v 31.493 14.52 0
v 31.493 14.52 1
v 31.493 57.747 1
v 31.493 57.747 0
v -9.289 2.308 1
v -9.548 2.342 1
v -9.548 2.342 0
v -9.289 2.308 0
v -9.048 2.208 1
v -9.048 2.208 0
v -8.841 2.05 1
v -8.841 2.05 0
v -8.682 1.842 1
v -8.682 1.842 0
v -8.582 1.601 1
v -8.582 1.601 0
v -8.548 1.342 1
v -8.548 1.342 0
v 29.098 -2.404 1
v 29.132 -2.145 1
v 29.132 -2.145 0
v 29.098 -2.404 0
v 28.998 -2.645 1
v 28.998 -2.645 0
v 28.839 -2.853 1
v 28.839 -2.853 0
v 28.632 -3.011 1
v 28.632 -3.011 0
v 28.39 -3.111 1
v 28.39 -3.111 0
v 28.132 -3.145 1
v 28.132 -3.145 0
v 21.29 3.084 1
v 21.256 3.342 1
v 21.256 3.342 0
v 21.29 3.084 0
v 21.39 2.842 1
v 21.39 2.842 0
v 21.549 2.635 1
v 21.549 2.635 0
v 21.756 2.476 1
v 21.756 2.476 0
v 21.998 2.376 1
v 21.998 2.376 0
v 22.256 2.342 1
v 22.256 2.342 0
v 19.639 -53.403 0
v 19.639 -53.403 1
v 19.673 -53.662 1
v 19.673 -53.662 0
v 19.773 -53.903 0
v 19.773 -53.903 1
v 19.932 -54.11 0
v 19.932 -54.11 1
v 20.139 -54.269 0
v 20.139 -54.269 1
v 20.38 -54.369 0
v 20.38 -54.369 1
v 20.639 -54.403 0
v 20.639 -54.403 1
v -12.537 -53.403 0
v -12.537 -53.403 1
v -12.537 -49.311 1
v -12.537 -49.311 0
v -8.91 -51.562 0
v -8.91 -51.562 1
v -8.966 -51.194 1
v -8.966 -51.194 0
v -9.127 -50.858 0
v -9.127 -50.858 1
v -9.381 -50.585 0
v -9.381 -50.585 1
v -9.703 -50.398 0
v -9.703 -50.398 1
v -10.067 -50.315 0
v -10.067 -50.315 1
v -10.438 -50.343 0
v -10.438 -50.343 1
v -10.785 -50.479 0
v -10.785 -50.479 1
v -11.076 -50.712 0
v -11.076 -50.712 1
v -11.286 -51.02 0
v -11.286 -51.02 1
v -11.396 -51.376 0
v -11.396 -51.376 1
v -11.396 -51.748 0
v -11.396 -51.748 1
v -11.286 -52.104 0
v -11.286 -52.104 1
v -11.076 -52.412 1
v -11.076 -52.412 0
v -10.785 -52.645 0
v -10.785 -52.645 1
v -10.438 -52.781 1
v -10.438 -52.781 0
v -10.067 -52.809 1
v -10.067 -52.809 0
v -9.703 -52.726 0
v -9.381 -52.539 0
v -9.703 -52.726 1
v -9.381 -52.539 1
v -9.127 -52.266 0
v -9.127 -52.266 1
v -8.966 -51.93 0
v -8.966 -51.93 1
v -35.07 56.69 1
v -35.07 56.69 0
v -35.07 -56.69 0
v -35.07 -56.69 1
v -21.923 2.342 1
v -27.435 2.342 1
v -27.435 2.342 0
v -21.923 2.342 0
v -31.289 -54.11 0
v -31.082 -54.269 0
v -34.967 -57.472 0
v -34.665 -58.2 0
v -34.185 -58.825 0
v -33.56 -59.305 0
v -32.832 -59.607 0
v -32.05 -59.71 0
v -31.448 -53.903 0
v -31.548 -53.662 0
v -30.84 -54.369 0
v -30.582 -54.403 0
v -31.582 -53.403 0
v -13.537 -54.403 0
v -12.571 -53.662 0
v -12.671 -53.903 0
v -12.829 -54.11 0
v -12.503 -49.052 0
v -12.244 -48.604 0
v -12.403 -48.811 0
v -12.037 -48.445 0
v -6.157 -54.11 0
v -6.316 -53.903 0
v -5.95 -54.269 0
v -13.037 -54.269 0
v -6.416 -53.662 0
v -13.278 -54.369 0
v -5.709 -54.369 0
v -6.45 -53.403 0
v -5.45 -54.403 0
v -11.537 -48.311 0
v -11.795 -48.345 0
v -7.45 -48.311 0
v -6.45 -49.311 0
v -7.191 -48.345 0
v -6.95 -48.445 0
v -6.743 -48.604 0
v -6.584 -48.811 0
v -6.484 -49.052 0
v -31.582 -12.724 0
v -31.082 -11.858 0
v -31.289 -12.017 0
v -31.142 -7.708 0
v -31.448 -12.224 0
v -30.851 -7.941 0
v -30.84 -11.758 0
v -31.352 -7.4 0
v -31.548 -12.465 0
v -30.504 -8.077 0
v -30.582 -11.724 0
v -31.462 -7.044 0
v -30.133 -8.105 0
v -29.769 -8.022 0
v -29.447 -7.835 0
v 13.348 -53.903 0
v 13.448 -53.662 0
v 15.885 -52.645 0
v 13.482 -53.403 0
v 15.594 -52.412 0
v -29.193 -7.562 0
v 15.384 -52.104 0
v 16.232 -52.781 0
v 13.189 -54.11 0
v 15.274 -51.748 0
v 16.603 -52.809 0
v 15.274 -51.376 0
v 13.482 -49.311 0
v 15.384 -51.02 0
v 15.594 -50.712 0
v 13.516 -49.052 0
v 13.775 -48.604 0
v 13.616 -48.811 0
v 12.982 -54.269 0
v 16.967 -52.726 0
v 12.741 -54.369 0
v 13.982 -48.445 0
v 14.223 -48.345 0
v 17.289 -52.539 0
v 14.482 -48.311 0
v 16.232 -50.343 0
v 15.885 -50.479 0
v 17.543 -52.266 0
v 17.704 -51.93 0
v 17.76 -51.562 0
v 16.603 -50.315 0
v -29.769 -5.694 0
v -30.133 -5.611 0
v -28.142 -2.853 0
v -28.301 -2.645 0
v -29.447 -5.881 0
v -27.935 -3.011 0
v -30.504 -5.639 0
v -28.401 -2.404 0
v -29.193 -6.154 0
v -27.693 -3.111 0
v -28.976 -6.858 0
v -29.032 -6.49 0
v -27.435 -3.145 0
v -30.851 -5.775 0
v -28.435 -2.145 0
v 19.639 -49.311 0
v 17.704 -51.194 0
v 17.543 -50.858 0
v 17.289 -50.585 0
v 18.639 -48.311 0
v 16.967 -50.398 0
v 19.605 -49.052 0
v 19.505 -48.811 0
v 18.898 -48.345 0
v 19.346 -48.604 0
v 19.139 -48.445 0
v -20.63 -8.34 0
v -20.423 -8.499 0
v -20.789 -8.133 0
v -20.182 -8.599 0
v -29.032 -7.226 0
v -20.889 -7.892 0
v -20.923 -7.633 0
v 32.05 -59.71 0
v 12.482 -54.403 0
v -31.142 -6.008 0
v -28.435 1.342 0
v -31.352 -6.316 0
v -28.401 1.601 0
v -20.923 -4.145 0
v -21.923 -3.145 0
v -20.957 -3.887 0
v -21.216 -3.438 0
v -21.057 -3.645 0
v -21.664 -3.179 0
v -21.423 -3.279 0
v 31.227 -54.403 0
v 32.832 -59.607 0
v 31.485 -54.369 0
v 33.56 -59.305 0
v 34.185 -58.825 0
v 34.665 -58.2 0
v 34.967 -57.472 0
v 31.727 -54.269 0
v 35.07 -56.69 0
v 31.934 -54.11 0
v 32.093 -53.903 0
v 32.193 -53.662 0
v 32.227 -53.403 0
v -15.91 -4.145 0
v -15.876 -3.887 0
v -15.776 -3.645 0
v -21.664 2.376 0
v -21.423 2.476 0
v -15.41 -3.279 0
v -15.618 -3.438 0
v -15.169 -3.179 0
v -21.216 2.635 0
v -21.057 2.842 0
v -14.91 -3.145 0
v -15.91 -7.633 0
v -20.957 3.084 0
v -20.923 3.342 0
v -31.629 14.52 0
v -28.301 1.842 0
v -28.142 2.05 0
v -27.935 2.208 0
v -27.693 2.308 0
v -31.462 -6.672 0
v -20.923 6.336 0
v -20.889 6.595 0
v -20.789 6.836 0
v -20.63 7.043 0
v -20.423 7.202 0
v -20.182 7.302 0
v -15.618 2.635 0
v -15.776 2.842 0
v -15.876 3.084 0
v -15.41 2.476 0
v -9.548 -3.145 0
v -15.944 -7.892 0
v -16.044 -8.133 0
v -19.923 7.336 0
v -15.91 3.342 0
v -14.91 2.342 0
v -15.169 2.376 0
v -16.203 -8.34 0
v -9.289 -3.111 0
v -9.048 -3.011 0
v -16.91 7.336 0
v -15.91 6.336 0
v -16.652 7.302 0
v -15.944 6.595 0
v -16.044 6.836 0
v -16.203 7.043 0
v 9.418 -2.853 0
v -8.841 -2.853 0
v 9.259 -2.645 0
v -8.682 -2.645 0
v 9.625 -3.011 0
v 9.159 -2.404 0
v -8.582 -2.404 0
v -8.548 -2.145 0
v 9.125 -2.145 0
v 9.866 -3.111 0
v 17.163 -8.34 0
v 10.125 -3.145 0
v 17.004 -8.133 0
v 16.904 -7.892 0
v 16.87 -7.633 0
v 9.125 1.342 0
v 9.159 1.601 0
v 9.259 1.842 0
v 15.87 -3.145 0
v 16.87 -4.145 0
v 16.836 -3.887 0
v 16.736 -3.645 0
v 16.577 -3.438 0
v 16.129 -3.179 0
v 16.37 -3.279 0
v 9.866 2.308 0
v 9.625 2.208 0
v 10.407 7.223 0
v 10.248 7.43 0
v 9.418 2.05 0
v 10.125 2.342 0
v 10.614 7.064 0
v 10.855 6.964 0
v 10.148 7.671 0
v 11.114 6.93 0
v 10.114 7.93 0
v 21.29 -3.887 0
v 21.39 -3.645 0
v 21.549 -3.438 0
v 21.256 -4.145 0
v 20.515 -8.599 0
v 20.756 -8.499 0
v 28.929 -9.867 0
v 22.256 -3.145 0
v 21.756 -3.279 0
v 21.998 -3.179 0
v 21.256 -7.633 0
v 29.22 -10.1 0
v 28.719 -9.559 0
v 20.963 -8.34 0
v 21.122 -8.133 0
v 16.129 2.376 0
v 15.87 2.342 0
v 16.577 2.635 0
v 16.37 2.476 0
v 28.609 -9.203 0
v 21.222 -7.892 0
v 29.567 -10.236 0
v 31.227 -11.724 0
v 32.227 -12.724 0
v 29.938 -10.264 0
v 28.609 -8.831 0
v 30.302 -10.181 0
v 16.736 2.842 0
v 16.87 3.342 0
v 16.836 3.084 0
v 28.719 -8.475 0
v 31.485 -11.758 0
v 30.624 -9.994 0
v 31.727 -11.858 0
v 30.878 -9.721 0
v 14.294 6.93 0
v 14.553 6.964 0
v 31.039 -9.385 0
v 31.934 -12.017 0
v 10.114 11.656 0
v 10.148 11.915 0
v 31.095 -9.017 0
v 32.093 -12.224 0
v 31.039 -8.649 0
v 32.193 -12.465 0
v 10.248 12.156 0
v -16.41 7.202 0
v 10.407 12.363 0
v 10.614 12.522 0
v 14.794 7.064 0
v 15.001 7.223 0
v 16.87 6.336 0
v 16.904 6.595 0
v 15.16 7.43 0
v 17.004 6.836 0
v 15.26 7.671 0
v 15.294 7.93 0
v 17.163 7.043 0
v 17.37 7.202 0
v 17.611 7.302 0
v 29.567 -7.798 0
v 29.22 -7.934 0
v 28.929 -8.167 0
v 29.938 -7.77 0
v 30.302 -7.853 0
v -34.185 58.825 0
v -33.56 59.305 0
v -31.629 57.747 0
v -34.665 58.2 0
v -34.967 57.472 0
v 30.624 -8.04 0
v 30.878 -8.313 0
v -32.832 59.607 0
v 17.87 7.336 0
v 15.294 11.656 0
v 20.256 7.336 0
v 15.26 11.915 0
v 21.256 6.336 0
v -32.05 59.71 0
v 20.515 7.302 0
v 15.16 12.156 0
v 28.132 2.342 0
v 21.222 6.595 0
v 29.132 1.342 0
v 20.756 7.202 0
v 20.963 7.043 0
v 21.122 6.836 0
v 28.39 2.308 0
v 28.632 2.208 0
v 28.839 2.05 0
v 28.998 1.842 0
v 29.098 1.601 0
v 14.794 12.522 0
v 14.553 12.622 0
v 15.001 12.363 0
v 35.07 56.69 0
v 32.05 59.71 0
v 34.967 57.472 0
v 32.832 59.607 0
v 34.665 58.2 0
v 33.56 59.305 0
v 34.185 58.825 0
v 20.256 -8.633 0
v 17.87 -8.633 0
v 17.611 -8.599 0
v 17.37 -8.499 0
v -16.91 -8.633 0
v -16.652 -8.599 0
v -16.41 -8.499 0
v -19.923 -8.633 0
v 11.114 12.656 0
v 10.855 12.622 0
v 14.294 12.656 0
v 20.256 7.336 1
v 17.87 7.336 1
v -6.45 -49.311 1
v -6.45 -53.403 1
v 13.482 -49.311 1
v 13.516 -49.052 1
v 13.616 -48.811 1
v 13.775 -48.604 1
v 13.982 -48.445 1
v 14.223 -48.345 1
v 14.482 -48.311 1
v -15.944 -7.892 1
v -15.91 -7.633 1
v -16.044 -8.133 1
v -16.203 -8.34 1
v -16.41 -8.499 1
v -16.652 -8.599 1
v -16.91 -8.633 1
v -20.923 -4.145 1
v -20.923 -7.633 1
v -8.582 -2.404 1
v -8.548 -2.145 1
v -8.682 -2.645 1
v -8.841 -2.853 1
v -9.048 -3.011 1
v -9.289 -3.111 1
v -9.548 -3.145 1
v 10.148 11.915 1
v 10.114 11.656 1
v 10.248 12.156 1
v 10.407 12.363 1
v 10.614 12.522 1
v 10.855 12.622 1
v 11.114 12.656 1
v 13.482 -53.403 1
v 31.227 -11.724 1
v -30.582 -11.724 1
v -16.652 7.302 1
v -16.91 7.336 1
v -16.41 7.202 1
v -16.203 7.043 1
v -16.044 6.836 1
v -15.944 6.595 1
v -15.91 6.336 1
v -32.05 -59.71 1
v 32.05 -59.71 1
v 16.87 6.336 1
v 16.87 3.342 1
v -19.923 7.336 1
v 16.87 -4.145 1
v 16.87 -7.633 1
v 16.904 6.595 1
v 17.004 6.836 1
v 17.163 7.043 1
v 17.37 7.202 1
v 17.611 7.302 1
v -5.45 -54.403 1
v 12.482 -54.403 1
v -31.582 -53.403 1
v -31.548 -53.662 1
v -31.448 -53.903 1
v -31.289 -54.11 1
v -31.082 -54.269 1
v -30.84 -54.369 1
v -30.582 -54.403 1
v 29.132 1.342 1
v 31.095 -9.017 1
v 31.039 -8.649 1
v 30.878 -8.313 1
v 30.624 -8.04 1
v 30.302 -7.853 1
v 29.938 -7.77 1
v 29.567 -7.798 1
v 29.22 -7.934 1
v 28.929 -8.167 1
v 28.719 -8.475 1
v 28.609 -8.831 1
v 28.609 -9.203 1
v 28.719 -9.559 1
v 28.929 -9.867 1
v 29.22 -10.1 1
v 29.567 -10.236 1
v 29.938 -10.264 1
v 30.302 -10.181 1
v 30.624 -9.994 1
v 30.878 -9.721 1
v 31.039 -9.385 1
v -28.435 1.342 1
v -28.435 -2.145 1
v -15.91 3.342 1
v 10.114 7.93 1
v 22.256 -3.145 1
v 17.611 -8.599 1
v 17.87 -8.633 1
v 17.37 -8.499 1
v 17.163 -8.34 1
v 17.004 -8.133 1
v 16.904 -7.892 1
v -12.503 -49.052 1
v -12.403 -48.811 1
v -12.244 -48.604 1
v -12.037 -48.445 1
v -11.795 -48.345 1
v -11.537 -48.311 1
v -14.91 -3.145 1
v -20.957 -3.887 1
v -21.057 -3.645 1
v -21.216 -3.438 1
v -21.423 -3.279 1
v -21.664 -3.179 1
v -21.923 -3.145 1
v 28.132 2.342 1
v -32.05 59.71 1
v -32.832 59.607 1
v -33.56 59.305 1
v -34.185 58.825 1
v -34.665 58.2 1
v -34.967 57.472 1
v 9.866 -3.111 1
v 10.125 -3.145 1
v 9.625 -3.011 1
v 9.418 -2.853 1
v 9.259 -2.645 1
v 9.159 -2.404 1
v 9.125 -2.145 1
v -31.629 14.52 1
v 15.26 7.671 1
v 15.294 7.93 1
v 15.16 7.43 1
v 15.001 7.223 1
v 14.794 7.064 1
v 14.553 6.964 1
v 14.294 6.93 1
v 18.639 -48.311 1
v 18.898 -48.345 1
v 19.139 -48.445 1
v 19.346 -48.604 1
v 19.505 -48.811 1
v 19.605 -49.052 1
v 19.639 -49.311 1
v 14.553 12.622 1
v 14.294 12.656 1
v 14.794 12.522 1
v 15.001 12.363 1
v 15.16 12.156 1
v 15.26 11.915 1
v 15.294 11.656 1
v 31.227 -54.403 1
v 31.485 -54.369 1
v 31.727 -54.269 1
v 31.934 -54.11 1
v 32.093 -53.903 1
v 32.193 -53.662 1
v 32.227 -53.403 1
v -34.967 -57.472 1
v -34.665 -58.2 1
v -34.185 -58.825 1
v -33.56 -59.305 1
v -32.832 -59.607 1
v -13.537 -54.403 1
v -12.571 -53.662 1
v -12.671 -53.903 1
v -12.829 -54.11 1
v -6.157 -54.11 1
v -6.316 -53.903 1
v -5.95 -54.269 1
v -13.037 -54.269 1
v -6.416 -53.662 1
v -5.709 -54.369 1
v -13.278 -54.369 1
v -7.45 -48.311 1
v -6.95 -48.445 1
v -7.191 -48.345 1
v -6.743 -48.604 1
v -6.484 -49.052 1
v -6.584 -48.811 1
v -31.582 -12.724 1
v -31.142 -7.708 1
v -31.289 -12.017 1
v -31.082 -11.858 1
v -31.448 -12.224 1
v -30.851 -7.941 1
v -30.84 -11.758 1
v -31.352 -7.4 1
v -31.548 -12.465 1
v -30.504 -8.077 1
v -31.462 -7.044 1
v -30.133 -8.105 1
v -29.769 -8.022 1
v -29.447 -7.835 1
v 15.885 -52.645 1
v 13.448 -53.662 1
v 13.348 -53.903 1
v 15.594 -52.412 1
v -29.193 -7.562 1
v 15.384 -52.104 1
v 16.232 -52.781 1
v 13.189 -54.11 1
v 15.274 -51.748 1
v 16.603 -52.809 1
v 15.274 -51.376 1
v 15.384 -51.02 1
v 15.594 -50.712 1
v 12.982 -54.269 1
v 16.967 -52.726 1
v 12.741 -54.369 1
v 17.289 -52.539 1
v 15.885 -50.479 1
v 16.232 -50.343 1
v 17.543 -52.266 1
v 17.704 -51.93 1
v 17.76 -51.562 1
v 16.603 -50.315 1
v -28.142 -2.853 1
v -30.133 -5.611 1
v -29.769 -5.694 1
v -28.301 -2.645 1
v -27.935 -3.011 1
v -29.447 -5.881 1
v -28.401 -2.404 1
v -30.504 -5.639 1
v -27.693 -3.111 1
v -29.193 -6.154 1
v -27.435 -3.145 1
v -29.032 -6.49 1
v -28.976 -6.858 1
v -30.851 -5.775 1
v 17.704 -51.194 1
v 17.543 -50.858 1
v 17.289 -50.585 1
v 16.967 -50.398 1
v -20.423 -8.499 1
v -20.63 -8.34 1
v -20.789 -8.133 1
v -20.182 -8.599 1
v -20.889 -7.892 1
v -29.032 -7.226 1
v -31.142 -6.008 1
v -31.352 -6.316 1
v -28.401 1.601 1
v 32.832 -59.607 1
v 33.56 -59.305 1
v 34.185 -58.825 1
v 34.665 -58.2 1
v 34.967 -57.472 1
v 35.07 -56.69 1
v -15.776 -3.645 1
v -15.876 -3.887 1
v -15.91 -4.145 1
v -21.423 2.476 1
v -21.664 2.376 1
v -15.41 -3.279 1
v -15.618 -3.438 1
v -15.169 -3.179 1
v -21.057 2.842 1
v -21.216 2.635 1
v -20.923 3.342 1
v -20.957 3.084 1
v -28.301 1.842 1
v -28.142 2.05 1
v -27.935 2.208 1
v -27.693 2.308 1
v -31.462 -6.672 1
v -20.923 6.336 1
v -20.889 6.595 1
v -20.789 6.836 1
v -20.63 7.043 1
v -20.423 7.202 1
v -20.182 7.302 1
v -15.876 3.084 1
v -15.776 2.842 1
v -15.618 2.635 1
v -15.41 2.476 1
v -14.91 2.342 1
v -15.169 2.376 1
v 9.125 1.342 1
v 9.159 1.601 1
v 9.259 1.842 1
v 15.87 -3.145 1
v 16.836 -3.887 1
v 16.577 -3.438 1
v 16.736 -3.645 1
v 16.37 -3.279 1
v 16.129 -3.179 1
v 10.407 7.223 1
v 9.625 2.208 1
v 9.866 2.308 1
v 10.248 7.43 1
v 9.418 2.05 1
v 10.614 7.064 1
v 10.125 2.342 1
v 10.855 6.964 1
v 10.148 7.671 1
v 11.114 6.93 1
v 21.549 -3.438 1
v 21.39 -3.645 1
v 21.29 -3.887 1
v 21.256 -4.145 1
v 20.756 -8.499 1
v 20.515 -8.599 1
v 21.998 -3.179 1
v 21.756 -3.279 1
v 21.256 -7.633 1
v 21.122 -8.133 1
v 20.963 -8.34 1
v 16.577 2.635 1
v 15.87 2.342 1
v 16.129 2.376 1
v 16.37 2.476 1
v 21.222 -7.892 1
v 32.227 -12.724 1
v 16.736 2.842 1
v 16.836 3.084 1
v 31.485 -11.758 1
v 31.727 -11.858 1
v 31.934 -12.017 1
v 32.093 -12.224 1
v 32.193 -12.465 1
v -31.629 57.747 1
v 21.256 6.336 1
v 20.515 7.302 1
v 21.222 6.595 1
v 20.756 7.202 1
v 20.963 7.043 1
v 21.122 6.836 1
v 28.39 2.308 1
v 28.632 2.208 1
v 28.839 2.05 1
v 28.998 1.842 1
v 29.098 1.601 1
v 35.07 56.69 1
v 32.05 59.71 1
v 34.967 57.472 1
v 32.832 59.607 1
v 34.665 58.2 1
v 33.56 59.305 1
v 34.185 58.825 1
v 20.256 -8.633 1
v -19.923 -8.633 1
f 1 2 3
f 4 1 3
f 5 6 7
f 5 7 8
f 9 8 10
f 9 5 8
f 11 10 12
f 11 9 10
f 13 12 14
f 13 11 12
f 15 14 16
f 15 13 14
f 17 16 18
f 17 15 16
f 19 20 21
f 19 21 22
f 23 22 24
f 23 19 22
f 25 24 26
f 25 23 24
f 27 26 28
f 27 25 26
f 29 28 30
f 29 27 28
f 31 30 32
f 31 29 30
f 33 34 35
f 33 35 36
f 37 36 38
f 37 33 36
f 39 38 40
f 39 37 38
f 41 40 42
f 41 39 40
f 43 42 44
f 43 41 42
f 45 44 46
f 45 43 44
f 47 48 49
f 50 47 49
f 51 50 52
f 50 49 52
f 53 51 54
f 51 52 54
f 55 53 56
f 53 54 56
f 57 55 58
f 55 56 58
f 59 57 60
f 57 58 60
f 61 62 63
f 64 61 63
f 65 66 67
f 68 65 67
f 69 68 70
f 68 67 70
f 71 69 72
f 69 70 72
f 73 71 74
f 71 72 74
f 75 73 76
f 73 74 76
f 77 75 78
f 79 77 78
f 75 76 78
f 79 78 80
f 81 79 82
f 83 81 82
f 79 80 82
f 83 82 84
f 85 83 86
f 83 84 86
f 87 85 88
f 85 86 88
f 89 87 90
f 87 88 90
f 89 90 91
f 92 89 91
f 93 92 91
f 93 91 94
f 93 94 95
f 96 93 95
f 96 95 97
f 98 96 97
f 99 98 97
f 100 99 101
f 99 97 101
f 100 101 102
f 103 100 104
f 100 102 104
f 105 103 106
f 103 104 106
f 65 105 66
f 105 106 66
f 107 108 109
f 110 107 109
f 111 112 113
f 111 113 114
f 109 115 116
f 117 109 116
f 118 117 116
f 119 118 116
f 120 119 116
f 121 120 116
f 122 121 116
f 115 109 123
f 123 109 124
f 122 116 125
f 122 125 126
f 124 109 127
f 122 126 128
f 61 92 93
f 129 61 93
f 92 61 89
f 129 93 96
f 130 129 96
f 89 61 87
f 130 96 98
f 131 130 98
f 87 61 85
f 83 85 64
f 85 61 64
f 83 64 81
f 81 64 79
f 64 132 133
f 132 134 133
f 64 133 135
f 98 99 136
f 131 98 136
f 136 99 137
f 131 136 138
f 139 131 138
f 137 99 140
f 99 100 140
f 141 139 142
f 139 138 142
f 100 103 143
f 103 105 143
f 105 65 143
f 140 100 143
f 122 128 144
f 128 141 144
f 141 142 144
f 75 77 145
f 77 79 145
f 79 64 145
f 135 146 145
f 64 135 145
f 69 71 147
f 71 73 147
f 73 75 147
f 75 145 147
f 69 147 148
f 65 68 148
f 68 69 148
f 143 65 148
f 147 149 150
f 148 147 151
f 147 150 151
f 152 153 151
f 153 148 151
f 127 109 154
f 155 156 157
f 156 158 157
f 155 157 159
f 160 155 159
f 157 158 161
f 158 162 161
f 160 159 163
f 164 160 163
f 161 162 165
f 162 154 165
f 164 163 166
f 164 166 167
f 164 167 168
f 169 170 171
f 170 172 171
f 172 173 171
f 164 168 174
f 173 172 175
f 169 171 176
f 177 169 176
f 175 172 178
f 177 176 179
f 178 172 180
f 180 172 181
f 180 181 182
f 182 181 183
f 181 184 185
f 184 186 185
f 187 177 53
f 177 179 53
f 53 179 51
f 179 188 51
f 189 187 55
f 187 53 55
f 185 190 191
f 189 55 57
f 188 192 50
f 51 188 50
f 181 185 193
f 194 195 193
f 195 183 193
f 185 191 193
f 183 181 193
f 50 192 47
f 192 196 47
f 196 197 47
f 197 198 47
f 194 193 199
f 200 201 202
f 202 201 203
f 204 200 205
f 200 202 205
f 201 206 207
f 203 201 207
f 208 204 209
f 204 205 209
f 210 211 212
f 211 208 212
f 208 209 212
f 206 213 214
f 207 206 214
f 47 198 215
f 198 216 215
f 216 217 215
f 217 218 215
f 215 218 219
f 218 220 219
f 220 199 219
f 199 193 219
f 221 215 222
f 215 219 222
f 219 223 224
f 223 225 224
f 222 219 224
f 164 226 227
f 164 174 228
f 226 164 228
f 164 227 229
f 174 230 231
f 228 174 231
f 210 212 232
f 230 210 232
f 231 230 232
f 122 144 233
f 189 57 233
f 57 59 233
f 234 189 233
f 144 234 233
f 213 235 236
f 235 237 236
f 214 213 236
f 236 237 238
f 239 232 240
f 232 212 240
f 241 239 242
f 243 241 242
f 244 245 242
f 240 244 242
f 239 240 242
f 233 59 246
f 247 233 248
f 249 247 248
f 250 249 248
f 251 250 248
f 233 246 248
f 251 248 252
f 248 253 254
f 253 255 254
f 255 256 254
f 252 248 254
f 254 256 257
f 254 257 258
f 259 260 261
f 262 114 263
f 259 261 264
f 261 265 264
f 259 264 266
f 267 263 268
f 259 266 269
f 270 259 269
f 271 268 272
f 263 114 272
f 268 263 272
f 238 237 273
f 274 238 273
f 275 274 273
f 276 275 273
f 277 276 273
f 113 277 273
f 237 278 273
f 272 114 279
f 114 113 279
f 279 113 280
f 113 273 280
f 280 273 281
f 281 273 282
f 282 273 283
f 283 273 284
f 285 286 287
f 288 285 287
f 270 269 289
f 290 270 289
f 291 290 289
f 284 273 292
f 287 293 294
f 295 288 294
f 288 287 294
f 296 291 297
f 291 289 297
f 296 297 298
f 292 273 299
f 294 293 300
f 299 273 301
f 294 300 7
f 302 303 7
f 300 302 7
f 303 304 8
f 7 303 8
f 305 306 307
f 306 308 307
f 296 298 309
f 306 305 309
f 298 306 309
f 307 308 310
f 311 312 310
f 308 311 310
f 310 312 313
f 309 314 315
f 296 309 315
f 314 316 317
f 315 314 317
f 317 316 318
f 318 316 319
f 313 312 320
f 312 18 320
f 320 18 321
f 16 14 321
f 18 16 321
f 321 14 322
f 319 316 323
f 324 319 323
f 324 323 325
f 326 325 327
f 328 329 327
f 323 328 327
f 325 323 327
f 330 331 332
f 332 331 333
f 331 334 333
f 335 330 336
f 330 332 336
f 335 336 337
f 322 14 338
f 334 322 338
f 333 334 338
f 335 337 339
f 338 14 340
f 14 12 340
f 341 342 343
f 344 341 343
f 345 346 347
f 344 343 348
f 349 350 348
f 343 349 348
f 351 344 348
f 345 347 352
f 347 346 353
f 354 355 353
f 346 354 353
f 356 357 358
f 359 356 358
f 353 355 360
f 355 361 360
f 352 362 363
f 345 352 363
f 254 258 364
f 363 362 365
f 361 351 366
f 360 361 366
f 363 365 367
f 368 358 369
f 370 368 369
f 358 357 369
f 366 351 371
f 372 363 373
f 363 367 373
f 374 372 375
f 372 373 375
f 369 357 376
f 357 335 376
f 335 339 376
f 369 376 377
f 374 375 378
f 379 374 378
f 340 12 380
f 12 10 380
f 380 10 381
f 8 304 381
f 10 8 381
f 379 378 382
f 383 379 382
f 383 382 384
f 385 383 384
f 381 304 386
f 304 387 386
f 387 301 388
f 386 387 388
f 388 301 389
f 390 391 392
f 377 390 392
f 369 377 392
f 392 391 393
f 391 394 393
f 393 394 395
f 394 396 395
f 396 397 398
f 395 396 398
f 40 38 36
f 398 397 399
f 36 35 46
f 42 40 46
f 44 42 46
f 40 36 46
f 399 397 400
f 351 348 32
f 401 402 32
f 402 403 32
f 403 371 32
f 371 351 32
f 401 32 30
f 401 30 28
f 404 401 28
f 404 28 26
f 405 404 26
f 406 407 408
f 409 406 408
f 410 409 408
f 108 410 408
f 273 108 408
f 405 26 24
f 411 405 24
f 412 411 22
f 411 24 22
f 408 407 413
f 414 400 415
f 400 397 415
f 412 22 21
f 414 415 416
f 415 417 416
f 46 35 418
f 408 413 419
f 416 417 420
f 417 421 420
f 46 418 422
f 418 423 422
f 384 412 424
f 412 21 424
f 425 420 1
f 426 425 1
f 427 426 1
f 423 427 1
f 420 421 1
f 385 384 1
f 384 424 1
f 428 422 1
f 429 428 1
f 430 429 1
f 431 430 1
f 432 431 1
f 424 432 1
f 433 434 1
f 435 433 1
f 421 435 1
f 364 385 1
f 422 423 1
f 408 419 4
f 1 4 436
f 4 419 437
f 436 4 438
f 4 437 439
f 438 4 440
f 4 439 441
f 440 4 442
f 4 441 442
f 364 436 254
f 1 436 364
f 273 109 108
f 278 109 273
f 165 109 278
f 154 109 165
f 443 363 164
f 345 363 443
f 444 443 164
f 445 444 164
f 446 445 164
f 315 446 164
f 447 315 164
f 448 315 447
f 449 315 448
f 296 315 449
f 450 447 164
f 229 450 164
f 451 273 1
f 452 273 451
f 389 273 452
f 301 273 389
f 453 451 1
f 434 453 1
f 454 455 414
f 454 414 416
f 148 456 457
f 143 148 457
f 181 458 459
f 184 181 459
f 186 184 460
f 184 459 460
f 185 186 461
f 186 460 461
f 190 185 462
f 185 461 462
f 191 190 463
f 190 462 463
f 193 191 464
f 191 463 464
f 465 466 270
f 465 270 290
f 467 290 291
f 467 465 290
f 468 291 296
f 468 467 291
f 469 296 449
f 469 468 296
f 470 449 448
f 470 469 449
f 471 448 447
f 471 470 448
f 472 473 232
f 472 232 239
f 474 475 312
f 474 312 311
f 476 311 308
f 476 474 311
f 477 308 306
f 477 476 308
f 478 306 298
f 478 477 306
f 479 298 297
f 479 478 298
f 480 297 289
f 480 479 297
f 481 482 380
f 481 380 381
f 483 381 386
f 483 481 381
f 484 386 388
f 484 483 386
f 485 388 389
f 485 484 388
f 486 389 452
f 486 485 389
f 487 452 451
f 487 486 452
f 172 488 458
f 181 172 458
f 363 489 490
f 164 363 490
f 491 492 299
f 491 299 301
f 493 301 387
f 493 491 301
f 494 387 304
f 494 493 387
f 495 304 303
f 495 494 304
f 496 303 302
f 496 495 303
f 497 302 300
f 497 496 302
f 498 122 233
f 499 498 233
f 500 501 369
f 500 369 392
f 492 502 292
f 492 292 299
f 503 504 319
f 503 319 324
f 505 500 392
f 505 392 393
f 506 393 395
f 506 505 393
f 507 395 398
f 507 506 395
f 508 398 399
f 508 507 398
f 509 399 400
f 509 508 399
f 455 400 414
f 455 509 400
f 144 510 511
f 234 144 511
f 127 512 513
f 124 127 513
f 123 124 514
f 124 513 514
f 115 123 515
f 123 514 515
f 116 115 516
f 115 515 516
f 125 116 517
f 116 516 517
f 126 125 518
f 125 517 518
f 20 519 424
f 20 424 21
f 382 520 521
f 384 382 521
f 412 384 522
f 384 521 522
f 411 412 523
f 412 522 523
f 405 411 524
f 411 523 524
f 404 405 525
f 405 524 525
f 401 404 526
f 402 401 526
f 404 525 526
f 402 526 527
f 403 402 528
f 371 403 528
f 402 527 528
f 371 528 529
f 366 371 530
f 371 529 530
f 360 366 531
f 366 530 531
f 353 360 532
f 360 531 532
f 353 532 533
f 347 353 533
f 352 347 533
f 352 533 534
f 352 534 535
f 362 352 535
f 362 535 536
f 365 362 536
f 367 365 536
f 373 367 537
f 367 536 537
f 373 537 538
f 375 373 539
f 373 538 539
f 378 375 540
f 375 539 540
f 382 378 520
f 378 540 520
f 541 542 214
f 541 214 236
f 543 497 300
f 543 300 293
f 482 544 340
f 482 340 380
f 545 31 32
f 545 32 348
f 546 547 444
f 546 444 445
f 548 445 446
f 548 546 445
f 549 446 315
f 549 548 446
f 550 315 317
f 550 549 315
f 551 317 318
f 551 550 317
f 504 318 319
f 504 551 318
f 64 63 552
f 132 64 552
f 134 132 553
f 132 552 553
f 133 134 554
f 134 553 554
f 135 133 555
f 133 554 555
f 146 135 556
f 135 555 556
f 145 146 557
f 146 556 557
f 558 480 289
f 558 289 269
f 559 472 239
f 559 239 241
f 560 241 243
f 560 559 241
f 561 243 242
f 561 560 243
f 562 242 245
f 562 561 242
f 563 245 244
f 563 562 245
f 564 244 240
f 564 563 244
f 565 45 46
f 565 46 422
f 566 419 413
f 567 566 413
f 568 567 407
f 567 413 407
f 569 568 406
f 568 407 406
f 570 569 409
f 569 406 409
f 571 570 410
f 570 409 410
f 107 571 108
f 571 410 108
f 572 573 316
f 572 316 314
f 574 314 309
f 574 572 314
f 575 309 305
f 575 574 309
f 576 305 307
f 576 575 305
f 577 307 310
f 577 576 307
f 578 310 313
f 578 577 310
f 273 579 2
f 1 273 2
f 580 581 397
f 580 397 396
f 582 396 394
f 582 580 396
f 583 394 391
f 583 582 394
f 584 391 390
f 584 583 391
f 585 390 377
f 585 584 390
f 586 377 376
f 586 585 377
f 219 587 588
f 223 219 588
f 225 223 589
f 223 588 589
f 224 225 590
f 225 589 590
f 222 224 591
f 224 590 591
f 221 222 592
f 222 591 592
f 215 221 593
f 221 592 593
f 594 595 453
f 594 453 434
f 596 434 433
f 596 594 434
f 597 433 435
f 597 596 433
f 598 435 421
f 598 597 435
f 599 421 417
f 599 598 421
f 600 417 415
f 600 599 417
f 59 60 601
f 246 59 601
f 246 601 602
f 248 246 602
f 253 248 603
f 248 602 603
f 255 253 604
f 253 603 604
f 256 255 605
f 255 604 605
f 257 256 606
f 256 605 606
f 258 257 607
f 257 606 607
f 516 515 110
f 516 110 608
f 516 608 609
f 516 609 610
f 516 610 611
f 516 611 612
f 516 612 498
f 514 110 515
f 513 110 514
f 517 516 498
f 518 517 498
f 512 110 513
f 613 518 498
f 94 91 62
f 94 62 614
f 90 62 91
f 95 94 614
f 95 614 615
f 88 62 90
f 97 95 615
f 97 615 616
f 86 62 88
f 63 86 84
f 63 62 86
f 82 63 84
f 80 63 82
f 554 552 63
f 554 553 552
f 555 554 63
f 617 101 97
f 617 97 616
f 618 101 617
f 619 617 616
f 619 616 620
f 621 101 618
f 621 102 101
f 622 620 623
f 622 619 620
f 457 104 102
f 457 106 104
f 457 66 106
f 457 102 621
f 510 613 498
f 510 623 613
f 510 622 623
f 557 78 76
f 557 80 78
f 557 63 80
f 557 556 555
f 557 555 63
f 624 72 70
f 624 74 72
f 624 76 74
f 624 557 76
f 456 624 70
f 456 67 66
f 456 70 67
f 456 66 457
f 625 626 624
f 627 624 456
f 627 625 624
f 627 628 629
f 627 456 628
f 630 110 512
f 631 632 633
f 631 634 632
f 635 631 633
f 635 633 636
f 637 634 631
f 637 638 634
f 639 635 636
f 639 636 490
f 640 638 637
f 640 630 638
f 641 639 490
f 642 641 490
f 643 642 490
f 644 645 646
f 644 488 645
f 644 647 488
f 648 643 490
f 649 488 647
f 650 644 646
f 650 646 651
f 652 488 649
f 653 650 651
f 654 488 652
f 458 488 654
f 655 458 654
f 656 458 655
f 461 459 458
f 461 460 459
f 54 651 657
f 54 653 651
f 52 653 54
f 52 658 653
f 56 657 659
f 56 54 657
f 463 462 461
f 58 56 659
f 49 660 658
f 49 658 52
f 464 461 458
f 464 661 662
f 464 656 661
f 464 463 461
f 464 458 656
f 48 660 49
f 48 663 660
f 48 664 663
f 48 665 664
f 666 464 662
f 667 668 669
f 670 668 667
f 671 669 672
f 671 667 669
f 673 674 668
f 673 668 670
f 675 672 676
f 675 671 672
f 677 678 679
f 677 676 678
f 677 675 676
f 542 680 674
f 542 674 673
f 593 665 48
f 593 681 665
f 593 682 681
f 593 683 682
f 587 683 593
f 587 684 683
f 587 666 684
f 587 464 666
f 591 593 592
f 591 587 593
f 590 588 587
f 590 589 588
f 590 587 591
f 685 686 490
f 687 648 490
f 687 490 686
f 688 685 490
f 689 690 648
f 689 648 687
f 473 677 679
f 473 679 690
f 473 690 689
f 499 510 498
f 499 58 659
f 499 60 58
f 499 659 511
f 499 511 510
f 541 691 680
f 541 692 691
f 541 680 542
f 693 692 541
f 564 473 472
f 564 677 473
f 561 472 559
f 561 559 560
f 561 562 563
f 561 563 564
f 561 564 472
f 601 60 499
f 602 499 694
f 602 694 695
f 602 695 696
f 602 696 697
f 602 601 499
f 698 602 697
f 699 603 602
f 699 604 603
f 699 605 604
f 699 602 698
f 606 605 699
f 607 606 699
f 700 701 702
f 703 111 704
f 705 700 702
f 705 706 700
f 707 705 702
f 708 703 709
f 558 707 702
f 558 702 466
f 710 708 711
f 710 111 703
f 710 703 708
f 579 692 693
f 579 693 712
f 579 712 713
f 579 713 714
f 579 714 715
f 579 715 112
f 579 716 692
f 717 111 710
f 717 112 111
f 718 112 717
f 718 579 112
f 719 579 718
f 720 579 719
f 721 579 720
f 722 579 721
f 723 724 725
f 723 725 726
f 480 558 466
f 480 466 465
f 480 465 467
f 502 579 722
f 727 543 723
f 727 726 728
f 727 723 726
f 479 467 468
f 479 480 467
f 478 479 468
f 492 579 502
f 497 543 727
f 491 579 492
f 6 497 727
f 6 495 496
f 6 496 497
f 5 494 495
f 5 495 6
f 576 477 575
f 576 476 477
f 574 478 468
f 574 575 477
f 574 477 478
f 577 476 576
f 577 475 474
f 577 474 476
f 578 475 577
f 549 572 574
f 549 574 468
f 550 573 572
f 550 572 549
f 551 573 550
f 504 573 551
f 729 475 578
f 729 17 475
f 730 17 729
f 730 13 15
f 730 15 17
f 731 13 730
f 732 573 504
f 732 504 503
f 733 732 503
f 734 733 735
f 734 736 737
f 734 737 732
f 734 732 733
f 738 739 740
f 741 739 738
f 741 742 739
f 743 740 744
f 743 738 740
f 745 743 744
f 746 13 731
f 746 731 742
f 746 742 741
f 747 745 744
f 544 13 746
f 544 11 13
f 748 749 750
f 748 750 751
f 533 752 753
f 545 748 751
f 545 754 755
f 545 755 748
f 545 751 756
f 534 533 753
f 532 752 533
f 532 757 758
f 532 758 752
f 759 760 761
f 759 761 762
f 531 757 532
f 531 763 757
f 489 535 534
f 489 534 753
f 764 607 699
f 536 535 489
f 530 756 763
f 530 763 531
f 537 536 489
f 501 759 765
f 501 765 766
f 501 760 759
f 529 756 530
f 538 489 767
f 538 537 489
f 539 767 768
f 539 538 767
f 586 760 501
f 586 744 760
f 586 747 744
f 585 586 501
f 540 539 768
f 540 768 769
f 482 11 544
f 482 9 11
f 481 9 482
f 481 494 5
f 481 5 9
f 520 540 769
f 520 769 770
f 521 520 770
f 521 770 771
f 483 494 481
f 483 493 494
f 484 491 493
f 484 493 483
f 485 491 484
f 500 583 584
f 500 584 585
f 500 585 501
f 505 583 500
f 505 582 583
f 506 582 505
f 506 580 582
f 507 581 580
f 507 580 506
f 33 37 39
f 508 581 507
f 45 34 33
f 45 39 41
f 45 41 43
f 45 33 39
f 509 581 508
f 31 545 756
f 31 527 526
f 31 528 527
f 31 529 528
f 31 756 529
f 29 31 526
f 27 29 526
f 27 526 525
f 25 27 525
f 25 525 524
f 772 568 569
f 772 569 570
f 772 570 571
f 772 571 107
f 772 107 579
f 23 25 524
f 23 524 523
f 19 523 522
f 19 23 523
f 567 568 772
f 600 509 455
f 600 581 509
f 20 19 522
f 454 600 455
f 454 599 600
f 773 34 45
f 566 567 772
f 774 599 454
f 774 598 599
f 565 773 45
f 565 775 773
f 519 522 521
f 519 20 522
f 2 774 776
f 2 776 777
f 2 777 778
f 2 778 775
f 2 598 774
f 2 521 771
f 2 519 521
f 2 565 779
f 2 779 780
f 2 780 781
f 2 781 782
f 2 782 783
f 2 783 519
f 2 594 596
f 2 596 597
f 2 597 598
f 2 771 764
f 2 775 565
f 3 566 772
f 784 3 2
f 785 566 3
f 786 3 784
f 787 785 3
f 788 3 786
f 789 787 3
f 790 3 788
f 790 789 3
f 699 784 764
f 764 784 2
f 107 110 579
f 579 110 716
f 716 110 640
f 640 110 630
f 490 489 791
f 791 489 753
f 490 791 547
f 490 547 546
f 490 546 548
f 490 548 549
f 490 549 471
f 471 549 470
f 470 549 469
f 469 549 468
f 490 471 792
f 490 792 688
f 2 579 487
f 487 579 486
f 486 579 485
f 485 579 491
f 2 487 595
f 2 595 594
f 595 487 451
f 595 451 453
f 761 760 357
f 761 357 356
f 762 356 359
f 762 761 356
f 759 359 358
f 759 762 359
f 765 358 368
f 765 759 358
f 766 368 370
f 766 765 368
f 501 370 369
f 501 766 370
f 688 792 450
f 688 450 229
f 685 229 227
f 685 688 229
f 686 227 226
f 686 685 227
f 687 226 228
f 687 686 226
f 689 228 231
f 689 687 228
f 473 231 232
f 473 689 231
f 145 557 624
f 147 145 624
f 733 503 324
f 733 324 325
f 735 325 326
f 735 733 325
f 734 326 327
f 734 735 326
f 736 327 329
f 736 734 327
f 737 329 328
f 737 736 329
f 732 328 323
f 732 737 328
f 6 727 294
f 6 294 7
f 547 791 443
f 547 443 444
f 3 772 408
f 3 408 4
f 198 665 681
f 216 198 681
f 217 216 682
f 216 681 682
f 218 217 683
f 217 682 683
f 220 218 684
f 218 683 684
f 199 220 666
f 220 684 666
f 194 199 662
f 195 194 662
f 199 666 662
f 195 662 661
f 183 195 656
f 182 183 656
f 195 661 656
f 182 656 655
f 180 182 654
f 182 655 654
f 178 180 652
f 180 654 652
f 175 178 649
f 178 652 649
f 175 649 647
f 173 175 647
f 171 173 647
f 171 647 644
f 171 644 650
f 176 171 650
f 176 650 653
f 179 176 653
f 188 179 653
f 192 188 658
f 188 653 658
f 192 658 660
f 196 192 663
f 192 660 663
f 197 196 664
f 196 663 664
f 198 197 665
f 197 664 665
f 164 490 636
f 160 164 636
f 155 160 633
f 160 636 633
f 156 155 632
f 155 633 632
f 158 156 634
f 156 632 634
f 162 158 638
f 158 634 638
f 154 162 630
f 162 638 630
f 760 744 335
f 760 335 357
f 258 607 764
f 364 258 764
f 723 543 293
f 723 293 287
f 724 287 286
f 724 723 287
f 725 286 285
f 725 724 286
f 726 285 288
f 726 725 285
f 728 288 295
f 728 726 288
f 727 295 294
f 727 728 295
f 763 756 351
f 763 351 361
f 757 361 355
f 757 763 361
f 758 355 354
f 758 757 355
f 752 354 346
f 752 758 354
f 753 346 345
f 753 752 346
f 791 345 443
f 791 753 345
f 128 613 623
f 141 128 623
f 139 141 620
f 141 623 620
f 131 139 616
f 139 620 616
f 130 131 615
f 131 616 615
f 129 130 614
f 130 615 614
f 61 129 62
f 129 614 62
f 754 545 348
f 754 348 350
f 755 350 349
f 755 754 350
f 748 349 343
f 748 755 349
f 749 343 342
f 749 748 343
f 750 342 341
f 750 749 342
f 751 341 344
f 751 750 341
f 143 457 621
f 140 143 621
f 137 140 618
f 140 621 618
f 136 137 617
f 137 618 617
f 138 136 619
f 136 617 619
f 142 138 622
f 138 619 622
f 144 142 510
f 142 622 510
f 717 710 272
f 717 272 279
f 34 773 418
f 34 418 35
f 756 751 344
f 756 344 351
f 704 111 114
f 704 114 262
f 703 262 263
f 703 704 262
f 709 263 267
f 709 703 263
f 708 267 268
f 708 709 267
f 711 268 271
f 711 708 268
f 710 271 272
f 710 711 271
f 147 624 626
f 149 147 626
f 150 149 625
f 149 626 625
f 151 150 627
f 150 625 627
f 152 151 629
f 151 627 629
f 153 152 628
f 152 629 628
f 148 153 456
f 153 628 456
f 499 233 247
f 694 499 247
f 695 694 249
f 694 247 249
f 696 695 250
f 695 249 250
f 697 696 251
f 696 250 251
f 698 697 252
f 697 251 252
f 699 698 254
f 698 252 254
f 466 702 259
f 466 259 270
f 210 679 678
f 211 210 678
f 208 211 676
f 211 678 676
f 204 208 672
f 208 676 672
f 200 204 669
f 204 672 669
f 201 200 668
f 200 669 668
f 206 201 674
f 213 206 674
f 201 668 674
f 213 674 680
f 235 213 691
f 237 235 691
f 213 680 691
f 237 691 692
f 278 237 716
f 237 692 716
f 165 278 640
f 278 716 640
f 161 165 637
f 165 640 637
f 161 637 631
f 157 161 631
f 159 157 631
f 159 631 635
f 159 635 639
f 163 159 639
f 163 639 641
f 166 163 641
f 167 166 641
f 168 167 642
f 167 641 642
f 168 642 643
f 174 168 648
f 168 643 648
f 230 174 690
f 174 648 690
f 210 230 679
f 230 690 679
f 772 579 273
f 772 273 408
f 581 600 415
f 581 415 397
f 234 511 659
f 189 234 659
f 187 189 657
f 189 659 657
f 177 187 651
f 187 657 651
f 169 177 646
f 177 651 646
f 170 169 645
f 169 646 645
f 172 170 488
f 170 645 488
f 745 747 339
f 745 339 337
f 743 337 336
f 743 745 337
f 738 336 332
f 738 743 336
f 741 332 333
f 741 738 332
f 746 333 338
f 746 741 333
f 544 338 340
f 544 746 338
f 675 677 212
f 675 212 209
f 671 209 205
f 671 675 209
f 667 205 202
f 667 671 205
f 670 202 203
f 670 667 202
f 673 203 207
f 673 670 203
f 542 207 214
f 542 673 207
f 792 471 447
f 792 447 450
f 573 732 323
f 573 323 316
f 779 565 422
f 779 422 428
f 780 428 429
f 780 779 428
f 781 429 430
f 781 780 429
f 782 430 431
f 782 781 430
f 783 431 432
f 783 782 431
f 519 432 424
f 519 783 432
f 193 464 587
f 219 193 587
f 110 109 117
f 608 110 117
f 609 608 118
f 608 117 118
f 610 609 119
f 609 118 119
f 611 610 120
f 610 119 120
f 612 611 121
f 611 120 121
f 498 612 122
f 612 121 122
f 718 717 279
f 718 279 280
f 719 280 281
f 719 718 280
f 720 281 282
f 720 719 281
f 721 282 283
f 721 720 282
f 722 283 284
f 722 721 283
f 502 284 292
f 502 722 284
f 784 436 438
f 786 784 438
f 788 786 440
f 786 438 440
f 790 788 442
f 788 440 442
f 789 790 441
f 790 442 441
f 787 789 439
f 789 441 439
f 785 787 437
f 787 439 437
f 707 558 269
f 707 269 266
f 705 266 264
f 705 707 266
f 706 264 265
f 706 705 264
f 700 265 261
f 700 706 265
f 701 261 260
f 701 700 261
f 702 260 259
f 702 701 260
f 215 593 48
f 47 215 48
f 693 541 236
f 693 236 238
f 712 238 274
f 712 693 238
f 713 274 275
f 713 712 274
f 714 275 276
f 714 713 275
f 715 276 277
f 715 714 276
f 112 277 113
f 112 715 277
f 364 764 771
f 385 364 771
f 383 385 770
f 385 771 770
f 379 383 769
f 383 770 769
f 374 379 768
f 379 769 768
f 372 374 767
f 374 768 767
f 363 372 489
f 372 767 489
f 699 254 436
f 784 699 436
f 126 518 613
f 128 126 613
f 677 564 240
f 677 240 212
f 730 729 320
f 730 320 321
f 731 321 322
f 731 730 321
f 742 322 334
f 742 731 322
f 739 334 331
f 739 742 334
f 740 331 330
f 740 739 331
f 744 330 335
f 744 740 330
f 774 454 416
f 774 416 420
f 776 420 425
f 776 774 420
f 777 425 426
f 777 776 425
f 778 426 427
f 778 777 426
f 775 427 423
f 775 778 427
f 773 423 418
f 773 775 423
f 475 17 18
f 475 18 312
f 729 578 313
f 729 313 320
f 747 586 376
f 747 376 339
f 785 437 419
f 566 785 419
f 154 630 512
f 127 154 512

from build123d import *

# Parameters (mm, degrees)
BOSS_EXTRU_1_DEPTH      = 1
ESQUISSE2_W             = 63.121311346
ESQUISSE2_H             = 43.227445896
ENL_V_MAT_EXTRU_1_DEPTH = 1
ENL_V_MAT_EXTRU_2_DEPTH = 1
ESQUISSE4_R             = 1.25
ENL_V_MAT_EXTRU_3_DEPTH = 1


with BuildPart() as part:
    # Esquisse1 → Boss.-Extru.1 (new body)
    with BuildSketch(Plane.XY):
        with BuildLine():
            Line((-32.05, -59.71), (32.05, -59.71))
            ThreePointArc((32.05, -59.71), (34.185462479, -58.825462479), (35.07, -56.69))
            Line((35.07, -56.69), (35.07, 56.69))
            ThreePointArc((35.07, 56.69), (34.185462479, 58.825462479), (32.05, 59.71))
            Line((32.05, 59.71), (-32.05, 59.71))
            ThreePointArc((-32.05, 59.71), (-34.185462479, 58.825462479), (-35.07, 56.69))
            Line((-35.07, 56.69), (-35.07, -56.69))
            ThreePointArc((-35.07, -56.69), (-34.185462479, -58.825462479), (-32.05, -59.71))
        make_face()
    extrude(amount=BOSS_EXTRU_1_DEPTH)

    # Esquisse2 → Enlèv. mat.-Extru.1 (cut)
    with BuildSketch(Plane.XY.offset(1)):
        with Locations((-0.068131464, 36.133663017)):
            Rectangle(ESQUISSE2_W, ESQUISSE2_H)
    extrude(amount=-ENL_V_MAT_EXTRU_1_DEPTH, mode=Mode.SUBTRACT)

    # Esquisse3 → Enlèv. mat.-Extru.2 (cut)
    with BuildSketch(Plane.XY.offset(1)):
        with BuildLine():
            Line((-5.450287773, -54.403229927), (12.482160985, -54.403229927))
            ThreePointArc((12.482160985, -54.403229927), (13.189267766, -54.110336708), (13.482160985, -53.403229927))
            Line((13.482160985, -53.403229927), (13.482160985, -49.311147183))
            ThreePointArc((13.482160985, -49.311147183), (13.775054203, -48.604040402), (14.482160985, -48.311147183))
            Line((14.482160985, -48.311147183), (18.639313678, -48.311147183))
            ThreePointArc((18.639313678, -48.311147183), (19.346420459, -48.604040402), (19.639313678, -49.311147183))
            Line((19.639313678, -49.311147183), (19.639313678, -53.403229927))
            ThreePointArc((19.639313678, -53.403229927), (19.932206896, -54.110336708), (20.639313678, -54.403229927))
            Line((20.639313678, -54.403229927), (31.226680359, -54.403229927))
            ThreePointArc((31.226680359, -54.403229927), (31.93378714, -54.110336708), (32.226680359, -53.403229927))
            Line((32.226680359, -53.403229927), (32.226680359, -12.723689117))
            ThreePointArc((32.226680359, -12.723689117), (31.93378714, -12.016582336), (31.226680359, -11.723689117))
            Line((31.226680359, -11.723689117), (-30.58163263, -11.723689117))
            ThreePointArc((-30.58163263, -11.723689117), (-31.288739411, -12.016582336), (-31.58163263, -12.723689117))
            Line((-31.58163263, -12.723689117), (-31.58163263, -53.403229927))
            ThreePointArc((-31.58163263, -53.403229927), (-31.288739411, -54.110336708), (-30.58163263, -54.403229927))
            Line((-30.58163263, -54.403229927), (-13.536578839, -54.403229927))
            ThreePointArc((-13.536578839, -54.403229927), (-12.829472057, -54.110336708), (-12.536578839, -53.403229927))
            Line((-12.536578839, -53.403229927), (-12.536578839, -49.311147183))
            ThreePointArc((-12.536578839, -49.311147183), (-12.24368562, -48.604040402), (-11.536578839, -48.311147183))
            Line((-11.536578839, -48.311147183), (-7.450287773, -48.311147183))
            ThreePointArc((-7.450287773, -48.311147183), (-6.743180992, -48.604040402), (-6.450287773, -49.311147183))
            Line((-6.450287773, -49.311147183), (-6.450287773, -53.403229927))
            ThreePointArc((-6.450287773, -53.403229927), (-6.157394554, -54.110336708), (-5.450287773, -54.403229927))
        make_face()
        with BuildLine():
            Line((-14.910409974, 2.342410274), (-9.548047777, 2.342410274))
            ThreePointArc((-9.548047777, 2.342410274), (-8.840940996, 2.049517055), (-8.548047777, 1.342410274))
            Line((-8.548047777, 1.342410274), (-8.548047777, -2.145402138))
            ThreePointArc((-8.548047777, -2.145402138), (-8.840940996, -2.85250892), (-9.548047777, -3.145402138))
            Line((-9.548047777, -3.145402138), (-14.910409974, -3.145402138))
            ThreePointArc((-14.910409974, -3.145402138), (-15.617516755, -3.438295357), (-15.910409974, -4.145402138))
            Line((-15.910409974, -4.145402138), (-15.910409974, -7.633214551))
            ThreePointArc((-15.910409974, -7.633214551), (-16.203303193, -8.340321332), (-16.910409974, -8.633214551))
            Line((-16.910409974, -8.633214551), (-19.922709244, -8.633214551))
            ThreePointArc((-19.922709244, -8.633214551), (-20.629816025, -8.340321332), (-20.922709244, -7.633214551))
            Line((-20.922709244, -7.633214551), (-20.922709244, -4.145402138))
            ThreePointArc((-20.922709244, -4.145402138), (-21.215602463, -3.438295357), (-21.922709244, -3.145402138))
            Line((-21.922709244, -3.145402138), (-27.434575926, -3.145402138))
            ThreePointArc((-27.434575926, -3.145402138), (-28.141682707, -2.85250892), (-28.434575926, -2.145402138))
            Line((-28.434575926, -2.145402138), (-28.434575926, 1.342410274))
            ThreePointArc((-28.434575926, 1.342410274), (-28.141682707, 2.049517055), (-27.434575926, 2.342410274))
            Line((-27.434575926, 2.342410274), (-21.922709244, 2.342410274))
            ThreePointArc((-21.922709244, 2.342410274), (-21.215602463, 2.635303493), (-20.922709244, 3.342410274))
            Line((-20.922709244, 3.342410274), (-20.922709244, 6.336052927))
            ThreePointArc((-20.922709244, 6.336052927), (-20.629816025, 7.043159708), (-19.922709244, 7.336052927))
            Line((-19.922709244, 7.336052927), (-16.910409974, 7.336052927))
            ThreePointArc((-16.910409974, 7.336052927), (-16.203303193, 7.043159708), (-15.910409974, 6.336052927))
            Line((-15.910409974, 6.336052927), (-15.910409974, 3.342410274))
            ThreePointArc((-15.910409974, 3.342410274), (-15.617516755, 2.635303493), (-14.910409974, 2.342410274))
        make_face()
        with BuildLine():
            Line((22.256339951, 2.342410274), (28.131649076, 2.342410274))
            ThreePointArc((28.131649076, 2.342410274), (28.838755857, 2.049517055), (29.131649076, 1.342410274))
            Line((29.131649076, 1.342410274), (29.131649076, -2.145402138))
            ThreePointArc((29.131649076, -2.145402138), (28.838755857, -2.85250892), (28.131649076, -3.145402138))
            Line((28.131649076, -3.145402138), (22.256339951, -3.145402138))
            ThreePointArc((22.256339951, -3.145402138), (21.54923317, -3.438295357), (21.256339951, -4.145402138))
            Line((21.256339951, -4.145402138), (21.256339951, -7.633214551))
            ThreePointArc((21.256339951, -7.633214551), (20.963446732, -8.340321332), (20.256339951, -8.633214551))
            Line((20.256339951, -8.633214551), (17.869767116, -8.633214551))
            ThreePointArc((17.869767116, -8.633214551), (17.162660335, -8.340321332), (16.869767116, -7.633214551))
            Line((16.869767116, -7.633214551), (16.869767116, -4.145402138))
            ThreePointArc((16.869767116, -4.145402138), (16.576873898, -3.438295357), (15.869767116, -3.145402138))
            Line((15.869767116, -3.145402138), (10.124858061, -3.145402138))
            ThreePointArc((10.124858061, -3.145402138), (9.41775128, -2.85250892), (9.124858061, -2.145402138))
            Line((9.124858061, -2.145402138), (9.124858061, 1.342410274))
            ThreePointArc((9.124858061, 1.342410274), (9.41775128, 2.049517055), (10.124858061, 2.342410274))
            Line((10.124858061, 2.342410274), (15.869767116, 2.342410274))
            ThreePointArc((15.869767116, 2.342410274), (16.576873898, 2.635303493), (16.869767116, 3.342410274))
            Line((16.869767116, 3.342410274), (16.869767116, 6.336052927))
            ThreePointArc((16.869767116, 6.336052927), (17.162660335, 7.043159708), (17.869767116, 7.336052927))
            Line((17.869767116, 7.336052927), (20.256339951, 7.336052927))
            ThreePointArc((20.256339951, 7.336052927), (20.963446732, 7.043159708), (21.256339951, 6.336052927))
            Line((21.256339951, 6.336052927), (21.256339951, 3.342410274))
            ThreePointArc((21.256339951, 3.342410274), (21.54923317, 2.635303493), (22.256339951, 2.342410274))
        make_face()
        with BuildLine():
            Line((11.114053306, 12.655752766), (14.294222496, 12.655752766))
            ThreePointArc((14.294222496, 12.655752766), (15.001329278, 12.362859547), (15.294222496, 11.655752766))
            Line((15.294222496, 11.655752766), (15.294222496, 7.930302608))
            ThreePointArc((15.294222496, 7.930302608), (15.001329278, 7.223195827), (14.294222496, 6.930302608))
            Line((14.294222496, 6.930302608), (11.114053306, 6.930302608))
            ThreePointArc((11.114053306, 6.930302608), (10.406946525, 7.223195827), (10.114053306, 7.930302608))
            Line((10.114053306, 7.930302608), (10.114053306, 11.655752766))
            ThreePointArc((10.114053306, 11.655752766), (10.406946525, 12.362859547), (11.114053306, 12.655752766))
        make_face()
    extrude(amount=-ENL_V_MAT_EXTRU_2_DEPTH, mode=Mode.SUBTRACT)

    # Esquisse4 → Enlèv. mat.-Extru.3 (cut)
    with BuildSketch(Plane.XY.offset(1)):
        with Locations((-30.226, -6.858)):
            Circle(ESQUISSE4_R)
        with Locations((29.845, -9.017)):
            Circle(ESQUISSE4_R)
        with Locations((16.51, -51.562)):
            Circle(ESQUISSE4_R)
        with Locations((-10.16, -51.562)):
            Circle(ESQUISSE4_R)
    extrude(amount=-ENL_V_MAT_EXTRU_3_DEPTH, mode=Mode.SUBTRACT)


solid = part.part
